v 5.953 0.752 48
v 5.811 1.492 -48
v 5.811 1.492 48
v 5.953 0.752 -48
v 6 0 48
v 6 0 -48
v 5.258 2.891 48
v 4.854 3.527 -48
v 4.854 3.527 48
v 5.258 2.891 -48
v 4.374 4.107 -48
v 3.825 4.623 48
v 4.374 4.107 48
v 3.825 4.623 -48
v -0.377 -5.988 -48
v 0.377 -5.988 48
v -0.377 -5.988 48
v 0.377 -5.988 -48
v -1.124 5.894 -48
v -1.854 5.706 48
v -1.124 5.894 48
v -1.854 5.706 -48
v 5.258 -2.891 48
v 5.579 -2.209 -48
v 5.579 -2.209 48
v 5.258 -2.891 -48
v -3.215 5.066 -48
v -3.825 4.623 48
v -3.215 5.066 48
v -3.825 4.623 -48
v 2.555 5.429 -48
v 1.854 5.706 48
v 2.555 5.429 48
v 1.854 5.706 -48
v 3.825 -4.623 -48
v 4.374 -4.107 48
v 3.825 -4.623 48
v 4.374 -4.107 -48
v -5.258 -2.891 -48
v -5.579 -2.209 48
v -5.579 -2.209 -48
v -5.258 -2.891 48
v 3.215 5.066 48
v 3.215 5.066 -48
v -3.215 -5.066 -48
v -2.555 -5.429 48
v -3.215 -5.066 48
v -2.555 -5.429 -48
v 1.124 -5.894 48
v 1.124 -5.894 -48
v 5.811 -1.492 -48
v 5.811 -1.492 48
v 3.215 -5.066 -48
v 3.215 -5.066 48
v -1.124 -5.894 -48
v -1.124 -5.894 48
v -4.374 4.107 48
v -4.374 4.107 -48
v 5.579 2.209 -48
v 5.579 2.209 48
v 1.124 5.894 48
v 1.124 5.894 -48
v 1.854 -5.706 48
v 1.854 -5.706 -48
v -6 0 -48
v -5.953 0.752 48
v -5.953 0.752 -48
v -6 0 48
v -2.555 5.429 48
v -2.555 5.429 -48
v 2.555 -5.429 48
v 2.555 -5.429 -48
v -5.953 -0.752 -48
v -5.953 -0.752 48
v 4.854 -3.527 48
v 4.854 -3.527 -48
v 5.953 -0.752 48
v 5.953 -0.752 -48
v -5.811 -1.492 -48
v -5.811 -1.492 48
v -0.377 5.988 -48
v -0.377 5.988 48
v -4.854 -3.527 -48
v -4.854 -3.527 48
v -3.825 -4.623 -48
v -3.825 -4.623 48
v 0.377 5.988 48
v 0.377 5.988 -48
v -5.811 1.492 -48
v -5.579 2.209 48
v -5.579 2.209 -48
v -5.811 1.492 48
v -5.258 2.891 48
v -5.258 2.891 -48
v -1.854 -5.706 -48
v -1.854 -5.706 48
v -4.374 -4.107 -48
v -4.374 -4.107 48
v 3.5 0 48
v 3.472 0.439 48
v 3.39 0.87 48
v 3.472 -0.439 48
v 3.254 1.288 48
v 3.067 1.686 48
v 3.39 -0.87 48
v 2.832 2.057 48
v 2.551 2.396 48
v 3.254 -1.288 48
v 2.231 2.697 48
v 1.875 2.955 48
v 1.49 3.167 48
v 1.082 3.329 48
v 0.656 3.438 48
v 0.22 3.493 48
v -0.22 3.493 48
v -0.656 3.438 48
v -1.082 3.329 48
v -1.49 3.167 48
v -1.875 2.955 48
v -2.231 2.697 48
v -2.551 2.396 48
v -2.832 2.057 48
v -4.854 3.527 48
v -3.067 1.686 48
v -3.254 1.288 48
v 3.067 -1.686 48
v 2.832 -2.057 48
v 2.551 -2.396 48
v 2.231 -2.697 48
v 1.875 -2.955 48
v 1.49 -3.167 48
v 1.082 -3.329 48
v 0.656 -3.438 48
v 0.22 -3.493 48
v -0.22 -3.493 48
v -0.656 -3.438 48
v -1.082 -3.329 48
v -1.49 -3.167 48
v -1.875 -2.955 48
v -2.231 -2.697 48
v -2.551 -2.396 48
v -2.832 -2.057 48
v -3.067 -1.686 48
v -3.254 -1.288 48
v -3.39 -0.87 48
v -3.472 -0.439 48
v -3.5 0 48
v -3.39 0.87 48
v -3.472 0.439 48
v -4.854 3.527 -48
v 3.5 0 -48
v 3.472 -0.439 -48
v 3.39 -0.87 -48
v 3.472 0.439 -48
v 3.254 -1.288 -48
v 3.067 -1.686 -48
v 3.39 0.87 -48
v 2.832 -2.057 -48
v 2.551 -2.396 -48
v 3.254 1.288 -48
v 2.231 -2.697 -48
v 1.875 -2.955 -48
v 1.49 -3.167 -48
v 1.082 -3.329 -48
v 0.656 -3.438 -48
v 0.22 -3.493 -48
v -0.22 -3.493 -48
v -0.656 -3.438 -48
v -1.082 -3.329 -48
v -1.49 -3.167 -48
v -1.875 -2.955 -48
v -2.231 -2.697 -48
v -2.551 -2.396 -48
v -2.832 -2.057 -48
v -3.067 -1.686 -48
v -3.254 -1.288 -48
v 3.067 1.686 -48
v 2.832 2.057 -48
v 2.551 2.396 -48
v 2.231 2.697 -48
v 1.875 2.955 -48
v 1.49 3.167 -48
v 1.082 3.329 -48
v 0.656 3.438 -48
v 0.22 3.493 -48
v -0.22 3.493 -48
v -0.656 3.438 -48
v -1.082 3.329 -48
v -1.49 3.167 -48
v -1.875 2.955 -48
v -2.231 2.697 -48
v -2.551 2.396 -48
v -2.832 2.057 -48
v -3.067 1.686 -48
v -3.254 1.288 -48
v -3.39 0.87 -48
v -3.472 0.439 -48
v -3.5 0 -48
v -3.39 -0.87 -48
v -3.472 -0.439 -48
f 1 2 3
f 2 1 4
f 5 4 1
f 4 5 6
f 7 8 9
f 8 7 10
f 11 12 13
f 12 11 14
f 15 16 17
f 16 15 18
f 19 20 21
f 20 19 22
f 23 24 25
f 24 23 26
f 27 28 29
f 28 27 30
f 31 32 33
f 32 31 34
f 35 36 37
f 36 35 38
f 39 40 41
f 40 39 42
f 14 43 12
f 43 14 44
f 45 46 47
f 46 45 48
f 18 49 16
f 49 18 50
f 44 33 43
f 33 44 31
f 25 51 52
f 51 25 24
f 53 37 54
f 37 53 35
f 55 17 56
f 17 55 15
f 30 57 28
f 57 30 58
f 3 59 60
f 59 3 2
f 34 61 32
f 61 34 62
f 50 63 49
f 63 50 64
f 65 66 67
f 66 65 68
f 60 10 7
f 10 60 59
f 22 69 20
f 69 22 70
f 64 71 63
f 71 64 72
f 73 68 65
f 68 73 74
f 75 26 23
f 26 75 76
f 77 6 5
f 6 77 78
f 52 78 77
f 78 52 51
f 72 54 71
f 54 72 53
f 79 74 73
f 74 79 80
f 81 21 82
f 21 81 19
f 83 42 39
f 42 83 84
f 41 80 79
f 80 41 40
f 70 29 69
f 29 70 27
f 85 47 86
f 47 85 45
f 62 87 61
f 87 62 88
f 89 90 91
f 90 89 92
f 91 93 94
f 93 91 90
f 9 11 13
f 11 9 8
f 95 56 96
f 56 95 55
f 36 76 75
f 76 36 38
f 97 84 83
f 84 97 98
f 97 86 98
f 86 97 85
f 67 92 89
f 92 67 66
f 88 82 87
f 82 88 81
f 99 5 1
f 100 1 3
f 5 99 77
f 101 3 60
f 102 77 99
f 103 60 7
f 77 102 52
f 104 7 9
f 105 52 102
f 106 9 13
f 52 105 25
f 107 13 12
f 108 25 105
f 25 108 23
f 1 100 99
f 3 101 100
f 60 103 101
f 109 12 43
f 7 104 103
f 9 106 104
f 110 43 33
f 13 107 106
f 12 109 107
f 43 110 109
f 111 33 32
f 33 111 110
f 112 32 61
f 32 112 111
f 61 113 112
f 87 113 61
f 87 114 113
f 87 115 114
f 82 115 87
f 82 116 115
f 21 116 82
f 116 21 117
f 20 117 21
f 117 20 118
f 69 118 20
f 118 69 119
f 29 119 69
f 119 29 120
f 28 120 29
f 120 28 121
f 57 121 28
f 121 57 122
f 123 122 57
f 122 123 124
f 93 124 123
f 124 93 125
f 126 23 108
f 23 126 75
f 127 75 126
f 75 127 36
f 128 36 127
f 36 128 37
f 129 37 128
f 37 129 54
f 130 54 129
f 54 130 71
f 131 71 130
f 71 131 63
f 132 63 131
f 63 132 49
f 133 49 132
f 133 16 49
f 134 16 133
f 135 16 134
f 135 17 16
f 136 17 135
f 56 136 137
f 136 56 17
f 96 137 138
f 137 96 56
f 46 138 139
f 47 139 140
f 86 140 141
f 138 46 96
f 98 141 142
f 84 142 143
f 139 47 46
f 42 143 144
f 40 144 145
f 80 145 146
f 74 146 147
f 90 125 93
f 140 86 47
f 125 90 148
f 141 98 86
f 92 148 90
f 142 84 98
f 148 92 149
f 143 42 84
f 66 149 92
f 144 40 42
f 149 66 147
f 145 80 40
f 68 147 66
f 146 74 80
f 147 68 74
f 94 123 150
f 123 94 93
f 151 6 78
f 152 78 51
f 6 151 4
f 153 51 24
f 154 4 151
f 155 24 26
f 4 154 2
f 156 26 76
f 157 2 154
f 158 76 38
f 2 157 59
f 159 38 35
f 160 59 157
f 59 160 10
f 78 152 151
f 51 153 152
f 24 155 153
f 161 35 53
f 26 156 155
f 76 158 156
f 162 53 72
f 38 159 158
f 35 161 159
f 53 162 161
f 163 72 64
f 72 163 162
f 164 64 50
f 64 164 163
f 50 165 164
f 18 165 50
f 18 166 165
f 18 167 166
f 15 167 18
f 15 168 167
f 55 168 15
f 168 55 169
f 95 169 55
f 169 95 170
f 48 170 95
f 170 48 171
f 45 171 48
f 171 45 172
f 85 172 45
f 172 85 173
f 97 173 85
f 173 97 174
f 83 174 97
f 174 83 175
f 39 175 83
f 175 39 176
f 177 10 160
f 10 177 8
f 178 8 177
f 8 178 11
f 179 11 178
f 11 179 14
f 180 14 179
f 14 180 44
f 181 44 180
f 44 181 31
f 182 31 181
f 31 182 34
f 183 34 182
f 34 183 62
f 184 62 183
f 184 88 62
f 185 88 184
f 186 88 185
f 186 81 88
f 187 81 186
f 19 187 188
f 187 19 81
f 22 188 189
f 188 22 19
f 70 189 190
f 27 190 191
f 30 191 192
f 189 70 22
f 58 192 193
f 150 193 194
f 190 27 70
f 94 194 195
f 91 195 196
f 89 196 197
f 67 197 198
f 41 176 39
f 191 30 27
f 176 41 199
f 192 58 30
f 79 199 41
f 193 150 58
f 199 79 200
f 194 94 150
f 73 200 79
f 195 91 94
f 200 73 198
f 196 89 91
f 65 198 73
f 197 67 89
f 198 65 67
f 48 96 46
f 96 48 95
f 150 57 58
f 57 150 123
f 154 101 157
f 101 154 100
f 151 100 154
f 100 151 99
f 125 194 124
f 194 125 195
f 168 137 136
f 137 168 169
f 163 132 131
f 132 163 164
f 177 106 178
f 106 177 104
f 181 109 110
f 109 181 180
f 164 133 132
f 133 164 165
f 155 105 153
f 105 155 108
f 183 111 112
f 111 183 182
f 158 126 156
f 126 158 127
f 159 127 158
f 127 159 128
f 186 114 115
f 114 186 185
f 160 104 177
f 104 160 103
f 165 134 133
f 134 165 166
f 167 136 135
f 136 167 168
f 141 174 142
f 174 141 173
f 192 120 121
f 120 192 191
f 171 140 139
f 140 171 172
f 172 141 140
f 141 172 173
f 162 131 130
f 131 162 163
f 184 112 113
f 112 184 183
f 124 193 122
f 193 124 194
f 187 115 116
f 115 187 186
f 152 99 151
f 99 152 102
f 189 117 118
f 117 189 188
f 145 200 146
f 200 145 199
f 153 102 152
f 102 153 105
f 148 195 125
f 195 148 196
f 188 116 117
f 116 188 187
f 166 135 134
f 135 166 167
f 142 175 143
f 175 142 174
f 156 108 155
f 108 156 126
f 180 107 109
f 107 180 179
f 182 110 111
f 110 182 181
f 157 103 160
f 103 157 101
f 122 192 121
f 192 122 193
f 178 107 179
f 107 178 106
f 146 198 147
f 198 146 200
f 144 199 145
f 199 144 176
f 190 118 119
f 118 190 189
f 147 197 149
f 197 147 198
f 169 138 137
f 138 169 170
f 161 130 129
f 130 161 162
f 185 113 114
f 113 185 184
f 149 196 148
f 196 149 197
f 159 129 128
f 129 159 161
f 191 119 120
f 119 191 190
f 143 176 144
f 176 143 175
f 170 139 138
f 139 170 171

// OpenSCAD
$fn = 50;


difference() {
	union() {
		translate(v = [0, 0, -48.0000000000]) {
			cylinder(h = 96, r = 6.0000000000);
		}
	}
	union() {
		translate(v = [0, 0, -100.0000000000]) {
			cylinder(h = 200, r = 3.5000000000);
		}
	}
}
